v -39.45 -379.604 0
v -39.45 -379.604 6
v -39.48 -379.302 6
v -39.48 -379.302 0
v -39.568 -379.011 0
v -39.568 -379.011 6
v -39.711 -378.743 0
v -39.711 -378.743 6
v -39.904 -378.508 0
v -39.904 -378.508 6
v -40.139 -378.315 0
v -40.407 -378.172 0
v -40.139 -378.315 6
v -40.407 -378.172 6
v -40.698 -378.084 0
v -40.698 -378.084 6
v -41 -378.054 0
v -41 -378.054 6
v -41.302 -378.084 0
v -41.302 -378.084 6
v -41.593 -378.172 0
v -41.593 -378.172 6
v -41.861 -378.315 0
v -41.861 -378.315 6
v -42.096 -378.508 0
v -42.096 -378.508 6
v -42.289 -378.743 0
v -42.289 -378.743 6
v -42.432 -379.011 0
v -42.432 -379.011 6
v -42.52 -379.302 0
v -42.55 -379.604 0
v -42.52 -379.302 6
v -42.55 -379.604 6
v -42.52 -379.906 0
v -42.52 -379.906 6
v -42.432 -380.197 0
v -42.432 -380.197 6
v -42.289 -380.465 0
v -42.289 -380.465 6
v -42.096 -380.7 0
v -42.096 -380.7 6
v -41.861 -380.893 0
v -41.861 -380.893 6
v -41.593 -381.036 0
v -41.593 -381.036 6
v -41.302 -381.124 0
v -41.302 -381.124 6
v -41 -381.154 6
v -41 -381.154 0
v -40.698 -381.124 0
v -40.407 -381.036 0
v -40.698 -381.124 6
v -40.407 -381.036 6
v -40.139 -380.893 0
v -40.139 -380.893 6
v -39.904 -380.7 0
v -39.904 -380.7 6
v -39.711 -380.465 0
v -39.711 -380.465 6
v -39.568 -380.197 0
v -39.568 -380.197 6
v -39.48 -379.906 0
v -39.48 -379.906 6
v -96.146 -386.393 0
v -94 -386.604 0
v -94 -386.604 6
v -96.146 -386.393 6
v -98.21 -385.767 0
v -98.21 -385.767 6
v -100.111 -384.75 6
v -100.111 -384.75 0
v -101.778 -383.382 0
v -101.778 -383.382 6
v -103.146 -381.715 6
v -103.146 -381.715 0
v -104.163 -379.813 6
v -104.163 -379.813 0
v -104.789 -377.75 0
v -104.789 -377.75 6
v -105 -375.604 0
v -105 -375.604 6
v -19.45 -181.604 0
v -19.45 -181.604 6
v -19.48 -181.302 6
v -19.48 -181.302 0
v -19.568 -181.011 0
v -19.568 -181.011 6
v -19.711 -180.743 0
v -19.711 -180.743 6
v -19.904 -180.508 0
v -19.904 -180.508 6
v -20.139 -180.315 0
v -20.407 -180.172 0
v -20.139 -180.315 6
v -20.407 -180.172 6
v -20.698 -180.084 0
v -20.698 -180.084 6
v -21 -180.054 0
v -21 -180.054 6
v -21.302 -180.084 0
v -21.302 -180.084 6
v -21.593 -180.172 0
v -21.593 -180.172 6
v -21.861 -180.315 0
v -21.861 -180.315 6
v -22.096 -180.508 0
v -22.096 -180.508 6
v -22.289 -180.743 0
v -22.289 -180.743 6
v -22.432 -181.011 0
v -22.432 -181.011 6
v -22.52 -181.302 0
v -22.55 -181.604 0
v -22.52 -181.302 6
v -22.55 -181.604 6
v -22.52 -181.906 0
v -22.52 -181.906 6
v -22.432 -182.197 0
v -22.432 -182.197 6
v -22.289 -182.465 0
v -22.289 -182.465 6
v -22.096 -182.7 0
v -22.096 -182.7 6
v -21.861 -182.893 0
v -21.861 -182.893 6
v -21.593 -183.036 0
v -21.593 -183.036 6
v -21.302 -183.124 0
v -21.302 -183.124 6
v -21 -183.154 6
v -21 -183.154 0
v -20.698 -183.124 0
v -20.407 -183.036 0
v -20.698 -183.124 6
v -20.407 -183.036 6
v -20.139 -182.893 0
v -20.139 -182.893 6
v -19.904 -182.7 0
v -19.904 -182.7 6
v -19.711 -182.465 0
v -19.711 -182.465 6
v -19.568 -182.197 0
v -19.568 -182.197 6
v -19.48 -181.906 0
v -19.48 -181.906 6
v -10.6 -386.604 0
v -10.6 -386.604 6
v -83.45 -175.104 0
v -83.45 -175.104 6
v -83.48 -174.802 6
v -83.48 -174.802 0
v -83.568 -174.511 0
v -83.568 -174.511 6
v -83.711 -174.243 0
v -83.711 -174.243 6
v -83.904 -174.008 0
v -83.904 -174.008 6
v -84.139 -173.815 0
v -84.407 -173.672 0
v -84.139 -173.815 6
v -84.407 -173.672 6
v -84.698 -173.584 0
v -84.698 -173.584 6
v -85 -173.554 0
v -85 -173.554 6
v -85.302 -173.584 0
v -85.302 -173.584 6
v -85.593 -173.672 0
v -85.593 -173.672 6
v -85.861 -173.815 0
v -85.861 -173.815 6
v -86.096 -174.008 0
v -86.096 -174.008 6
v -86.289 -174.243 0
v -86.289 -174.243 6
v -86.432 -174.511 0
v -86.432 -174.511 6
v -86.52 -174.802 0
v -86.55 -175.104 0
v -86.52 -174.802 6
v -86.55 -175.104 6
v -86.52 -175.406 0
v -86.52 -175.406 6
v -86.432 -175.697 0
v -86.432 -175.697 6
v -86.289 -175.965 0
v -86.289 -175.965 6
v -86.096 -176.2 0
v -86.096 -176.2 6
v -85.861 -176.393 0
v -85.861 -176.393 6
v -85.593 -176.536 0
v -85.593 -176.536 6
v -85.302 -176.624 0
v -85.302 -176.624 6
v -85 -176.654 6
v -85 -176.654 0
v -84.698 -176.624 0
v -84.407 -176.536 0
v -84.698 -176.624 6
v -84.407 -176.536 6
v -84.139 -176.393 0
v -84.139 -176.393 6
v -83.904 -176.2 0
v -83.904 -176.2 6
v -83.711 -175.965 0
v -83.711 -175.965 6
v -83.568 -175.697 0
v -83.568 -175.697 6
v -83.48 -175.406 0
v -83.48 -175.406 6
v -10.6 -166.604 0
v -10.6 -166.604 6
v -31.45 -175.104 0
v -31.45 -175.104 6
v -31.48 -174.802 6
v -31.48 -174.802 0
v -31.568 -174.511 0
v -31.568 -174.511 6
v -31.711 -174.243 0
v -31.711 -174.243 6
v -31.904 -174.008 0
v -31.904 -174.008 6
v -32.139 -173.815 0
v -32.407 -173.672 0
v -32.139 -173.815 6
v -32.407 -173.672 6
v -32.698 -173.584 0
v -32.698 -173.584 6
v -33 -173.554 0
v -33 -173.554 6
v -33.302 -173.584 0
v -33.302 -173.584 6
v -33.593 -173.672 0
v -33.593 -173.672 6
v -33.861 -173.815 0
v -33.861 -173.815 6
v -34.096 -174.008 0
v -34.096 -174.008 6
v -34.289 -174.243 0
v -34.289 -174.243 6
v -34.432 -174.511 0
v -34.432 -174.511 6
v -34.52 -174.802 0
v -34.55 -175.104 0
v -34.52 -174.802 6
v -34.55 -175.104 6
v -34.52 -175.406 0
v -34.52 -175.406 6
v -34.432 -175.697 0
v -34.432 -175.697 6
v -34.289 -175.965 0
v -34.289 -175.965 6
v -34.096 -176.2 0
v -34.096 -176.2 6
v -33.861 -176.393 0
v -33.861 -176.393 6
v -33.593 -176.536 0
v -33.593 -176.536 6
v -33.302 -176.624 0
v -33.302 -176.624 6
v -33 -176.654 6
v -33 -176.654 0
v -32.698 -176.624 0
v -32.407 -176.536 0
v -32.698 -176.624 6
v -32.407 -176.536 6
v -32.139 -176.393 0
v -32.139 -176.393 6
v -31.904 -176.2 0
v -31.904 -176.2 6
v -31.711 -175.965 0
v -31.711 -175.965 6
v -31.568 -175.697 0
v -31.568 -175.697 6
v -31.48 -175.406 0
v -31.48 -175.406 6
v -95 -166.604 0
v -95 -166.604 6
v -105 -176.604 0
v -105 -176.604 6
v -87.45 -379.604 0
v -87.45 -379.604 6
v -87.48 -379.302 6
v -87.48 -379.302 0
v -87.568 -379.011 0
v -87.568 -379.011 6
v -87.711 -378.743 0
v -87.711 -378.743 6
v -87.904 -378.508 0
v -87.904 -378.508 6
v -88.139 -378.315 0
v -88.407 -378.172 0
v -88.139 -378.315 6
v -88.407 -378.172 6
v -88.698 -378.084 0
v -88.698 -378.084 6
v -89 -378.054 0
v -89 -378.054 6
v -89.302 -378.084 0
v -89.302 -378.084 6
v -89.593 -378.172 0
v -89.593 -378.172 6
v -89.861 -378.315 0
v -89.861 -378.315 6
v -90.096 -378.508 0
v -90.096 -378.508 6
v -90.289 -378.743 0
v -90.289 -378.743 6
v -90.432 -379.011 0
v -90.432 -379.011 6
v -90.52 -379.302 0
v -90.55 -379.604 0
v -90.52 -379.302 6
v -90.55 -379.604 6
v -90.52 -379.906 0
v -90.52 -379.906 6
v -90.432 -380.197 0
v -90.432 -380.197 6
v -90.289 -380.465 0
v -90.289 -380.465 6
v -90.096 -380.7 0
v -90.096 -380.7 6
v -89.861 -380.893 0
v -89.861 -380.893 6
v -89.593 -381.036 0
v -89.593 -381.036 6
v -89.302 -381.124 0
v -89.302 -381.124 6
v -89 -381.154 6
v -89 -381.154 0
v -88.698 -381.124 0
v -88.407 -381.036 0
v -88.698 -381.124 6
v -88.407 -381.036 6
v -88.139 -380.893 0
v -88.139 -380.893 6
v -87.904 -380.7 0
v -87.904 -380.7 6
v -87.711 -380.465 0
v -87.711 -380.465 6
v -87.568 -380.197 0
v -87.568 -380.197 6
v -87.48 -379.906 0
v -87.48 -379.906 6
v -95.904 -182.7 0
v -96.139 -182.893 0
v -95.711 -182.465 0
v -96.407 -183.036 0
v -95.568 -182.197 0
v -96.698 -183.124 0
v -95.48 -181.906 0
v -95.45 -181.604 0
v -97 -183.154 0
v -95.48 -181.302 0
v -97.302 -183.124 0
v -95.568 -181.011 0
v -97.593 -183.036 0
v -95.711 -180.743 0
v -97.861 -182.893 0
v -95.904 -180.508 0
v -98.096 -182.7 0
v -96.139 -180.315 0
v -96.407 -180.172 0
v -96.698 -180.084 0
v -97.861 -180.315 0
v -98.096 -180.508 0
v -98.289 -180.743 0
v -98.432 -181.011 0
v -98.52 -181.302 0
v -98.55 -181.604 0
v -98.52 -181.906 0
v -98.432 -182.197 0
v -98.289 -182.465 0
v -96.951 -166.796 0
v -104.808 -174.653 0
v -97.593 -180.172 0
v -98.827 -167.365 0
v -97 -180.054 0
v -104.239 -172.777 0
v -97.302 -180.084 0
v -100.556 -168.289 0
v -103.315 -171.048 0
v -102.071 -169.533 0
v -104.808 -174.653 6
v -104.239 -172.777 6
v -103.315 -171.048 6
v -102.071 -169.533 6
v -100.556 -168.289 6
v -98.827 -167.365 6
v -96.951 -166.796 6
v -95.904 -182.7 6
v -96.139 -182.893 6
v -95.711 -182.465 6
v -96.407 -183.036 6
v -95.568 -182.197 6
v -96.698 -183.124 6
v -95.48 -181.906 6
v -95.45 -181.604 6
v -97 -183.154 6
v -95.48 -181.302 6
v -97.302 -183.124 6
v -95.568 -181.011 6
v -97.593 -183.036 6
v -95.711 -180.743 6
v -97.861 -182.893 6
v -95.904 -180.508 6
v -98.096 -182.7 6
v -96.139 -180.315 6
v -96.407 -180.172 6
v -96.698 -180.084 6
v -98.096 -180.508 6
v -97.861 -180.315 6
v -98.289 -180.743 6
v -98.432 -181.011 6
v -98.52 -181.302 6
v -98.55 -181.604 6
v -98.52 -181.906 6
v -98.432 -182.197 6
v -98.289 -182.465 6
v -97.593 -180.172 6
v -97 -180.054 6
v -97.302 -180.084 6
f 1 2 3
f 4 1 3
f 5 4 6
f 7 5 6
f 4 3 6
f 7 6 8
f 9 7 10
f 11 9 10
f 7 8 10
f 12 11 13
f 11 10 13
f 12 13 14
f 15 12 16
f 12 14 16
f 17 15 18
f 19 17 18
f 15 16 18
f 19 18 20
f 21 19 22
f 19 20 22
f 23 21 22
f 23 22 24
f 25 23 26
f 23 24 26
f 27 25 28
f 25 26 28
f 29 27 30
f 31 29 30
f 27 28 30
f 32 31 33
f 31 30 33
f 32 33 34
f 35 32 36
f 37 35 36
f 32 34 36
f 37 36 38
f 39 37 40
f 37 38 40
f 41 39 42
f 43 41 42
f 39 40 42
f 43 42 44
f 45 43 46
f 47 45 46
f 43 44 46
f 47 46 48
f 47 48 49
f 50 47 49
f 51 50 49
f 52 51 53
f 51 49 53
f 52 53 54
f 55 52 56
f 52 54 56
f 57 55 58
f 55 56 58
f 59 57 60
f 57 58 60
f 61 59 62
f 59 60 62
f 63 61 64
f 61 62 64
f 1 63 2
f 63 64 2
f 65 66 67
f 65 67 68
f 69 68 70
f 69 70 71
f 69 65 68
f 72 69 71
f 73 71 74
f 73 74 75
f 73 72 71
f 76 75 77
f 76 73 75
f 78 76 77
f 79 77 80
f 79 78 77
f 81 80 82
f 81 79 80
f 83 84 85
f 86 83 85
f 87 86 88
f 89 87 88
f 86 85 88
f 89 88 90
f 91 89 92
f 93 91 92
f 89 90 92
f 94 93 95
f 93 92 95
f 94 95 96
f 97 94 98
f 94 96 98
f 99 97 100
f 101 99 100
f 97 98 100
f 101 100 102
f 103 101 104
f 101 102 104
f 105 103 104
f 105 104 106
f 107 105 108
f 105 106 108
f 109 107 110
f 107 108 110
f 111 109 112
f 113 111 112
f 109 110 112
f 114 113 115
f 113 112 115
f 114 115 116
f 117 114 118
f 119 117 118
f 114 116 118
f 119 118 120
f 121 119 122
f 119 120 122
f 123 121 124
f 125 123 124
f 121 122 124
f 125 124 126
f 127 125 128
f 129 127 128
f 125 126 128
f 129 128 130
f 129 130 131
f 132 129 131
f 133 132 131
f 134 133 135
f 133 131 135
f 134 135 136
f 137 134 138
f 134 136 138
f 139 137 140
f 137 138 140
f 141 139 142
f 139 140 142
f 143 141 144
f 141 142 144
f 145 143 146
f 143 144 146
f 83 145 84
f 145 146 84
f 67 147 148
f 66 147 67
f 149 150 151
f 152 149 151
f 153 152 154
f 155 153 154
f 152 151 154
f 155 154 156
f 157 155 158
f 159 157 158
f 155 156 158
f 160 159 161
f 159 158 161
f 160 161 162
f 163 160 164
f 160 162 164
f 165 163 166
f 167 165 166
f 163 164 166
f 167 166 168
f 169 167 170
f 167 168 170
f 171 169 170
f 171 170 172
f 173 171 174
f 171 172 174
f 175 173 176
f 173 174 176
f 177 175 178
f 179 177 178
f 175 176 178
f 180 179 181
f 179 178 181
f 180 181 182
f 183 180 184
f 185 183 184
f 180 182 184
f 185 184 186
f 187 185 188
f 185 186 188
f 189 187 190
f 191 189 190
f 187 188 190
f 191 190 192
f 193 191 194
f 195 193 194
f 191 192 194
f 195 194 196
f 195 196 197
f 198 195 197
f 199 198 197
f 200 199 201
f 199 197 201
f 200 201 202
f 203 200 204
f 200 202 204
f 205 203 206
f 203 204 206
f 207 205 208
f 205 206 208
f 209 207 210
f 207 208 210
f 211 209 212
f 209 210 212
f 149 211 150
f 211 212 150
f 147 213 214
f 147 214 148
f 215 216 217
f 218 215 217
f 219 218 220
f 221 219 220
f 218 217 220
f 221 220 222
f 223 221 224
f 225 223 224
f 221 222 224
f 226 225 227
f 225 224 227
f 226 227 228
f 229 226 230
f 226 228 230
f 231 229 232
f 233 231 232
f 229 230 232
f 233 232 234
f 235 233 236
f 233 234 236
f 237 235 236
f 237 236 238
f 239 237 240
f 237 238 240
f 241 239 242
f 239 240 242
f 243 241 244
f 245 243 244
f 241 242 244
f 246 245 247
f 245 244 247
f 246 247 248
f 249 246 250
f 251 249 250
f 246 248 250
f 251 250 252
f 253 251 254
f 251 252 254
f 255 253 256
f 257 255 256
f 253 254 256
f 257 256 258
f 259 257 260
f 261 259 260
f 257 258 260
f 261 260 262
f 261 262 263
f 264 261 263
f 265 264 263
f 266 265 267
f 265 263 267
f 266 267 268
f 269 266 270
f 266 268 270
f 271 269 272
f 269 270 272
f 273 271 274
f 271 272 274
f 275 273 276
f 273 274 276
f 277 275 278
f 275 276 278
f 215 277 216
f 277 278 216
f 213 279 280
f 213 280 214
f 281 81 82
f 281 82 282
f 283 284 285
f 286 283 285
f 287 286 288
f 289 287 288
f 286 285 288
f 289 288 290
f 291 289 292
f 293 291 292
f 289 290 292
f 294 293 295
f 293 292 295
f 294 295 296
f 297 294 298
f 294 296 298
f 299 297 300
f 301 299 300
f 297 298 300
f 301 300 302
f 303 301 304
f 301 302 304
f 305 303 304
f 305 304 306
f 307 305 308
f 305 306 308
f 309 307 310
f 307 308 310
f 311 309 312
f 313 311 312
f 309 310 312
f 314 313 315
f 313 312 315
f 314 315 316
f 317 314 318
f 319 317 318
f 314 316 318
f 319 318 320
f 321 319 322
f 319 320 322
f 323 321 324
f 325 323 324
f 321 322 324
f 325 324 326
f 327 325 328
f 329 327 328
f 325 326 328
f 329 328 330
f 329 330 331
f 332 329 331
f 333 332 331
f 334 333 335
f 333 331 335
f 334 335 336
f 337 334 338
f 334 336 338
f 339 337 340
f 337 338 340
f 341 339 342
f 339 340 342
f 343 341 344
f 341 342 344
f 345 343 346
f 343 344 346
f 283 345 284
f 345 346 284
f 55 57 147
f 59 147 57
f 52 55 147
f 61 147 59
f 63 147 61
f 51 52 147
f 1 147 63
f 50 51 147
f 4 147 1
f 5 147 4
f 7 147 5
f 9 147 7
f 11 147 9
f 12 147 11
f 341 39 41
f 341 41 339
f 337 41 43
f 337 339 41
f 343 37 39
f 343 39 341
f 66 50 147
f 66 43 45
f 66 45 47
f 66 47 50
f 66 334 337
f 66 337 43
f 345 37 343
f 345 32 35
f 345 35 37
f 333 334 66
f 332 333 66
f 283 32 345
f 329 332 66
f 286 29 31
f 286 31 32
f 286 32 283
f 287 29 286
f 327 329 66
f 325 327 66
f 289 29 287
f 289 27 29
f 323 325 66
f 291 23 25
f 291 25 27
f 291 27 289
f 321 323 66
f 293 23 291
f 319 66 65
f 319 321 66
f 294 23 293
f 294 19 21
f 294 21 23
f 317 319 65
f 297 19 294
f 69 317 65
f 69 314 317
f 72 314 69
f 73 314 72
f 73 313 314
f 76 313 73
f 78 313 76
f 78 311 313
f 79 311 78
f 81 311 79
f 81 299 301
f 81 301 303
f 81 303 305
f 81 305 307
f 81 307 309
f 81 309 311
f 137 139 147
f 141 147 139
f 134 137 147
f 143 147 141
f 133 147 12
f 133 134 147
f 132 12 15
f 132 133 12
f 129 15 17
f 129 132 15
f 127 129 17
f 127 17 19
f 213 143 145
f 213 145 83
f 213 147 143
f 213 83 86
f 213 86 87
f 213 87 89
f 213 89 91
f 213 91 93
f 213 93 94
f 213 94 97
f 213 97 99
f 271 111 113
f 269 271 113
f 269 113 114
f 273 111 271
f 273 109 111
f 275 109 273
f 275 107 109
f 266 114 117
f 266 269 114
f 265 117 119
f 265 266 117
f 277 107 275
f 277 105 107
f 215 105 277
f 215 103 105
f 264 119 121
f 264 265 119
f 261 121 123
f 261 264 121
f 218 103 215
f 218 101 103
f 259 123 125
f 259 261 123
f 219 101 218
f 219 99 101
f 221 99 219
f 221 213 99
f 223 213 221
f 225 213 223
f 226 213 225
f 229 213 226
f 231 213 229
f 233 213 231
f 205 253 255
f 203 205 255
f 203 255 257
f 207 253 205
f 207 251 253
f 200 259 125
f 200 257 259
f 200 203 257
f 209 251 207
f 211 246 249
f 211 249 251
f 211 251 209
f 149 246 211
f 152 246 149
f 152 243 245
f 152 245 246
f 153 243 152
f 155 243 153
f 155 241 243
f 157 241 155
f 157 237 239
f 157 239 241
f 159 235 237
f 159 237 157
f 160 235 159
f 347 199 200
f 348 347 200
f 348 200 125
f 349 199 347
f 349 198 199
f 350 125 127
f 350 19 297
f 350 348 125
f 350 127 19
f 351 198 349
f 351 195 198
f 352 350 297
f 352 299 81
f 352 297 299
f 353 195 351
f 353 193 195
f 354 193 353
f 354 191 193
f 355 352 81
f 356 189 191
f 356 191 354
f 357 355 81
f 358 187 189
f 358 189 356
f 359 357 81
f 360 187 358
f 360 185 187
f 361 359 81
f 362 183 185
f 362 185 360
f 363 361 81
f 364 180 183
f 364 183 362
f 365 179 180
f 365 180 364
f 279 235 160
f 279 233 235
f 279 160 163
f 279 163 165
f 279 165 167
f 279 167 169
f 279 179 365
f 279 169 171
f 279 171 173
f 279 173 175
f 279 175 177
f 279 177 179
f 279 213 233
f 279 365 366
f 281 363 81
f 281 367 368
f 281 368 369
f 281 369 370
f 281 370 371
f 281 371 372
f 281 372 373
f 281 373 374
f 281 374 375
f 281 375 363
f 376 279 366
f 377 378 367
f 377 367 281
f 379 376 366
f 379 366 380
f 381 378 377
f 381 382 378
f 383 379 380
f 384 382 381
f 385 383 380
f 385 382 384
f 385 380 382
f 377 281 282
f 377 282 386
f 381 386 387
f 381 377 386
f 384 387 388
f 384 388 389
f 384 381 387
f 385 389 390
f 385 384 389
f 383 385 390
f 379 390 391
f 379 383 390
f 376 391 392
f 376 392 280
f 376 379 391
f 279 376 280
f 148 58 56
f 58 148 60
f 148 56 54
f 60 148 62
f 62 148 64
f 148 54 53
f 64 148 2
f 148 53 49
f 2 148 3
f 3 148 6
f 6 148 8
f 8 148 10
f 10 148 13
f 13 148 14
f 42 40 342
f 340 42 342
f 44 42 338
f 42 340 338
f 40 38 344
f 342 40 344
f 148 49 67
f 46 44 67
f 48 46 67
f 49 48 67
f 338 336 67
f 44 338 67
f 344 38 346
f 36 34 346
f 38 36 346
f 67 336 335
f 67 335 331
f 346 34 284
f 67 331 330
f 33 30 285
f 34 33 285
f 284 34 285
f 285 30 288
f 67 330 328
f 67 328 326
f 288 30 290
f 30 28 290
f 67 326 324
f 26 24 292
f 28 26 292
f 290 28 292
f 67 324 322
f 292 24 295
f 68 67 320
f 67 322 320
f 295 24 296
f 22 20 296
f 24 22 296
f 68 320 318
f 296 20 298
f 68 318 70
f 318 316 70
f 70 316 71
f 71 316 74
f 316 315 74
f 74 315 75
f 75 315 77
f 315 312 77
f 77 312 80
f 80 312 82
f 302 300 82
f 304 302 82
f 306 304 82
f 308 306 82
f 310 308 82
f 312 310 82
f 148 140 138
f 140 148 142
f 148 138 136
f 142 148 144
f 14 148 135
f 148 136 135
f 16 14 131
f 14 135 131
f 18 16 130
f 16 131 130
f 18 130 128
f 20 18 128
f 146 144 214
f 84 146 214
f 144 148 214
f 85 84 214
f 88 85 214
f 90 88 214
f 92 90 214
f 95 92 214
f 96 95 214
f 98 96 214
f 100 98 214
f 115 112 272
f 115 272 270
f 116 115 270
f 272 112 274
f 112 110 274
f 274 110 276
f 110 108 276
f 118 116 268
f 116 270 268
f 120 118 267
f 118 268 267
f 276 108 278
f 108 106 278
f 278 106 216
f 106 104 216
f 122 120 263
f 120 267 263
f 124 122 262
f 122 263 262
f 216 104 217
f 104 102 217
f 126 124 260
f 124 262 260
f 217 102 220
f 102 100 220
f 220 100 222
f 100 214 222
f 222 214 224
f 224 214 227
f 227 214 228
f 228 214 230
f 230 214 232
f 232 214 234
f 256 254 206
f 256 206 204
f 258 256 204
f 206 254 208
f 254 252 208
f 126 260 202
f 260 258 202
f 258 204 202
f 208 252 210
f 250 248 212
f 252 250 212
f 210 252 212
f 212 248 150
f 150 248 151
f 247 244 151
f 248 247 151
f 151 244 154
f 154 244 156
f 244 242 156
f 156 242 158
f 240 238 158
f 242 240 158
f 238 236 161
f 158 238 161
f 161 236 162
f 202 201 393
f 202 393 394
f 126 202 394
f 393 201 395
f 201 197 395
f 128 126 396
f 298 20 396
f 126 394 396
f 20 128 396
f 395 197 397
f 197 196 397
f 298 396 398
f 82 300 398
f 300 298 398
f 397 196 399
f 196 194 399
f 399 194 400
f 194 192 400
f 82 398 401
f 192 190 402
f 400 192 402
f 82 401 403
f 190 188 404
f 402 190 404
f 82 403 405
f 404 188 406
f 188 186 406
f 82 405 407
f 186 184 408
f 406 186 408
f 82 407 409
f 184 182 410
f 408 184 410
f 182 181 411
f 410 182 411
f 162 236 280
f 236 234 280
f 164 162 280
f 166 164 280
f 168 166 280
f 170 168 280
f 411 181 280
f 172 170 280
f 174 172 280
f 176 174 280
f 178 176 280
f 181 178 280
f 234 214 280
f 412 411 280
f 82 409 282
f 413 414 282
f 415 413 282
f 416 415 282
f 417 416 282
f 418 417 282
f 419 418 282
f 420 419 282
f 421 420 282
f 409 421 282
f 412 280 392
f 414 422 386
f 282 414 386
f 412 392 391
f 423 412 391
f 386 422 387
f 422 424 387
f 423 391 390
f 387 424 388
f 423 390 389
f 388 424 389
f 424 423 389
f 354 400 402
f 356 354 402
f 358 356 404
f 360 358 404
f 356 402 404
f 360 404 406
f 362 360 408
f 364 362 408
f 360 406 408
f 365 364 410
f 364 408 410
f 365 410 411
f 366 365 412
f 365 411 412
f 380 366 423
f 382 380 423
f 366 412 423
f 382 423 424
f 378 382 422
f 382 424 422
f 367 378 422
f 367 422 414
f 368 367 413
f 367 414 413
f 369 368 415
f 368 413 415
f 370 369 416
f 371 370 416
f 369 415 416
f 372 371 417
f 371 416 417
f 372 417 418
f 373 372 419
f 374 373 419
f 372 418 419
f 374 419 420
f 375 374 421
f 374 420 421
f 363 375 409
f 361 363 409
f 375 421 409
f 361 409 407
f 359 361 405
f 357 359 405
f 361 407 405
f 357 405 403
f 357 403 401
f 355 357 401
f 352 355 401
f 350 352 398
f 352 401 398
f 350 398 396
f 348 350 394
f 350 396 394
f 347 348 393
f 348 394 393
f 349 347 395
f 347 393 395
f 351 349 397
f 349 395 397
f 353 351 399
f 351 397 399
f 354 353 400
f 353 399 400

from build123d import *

# Parameters (mm, degrees)
DODANIE_WYCI_GNI_CIE1_DEPTH = 6
SZKIC4_R                    = 1.55
WYTNIJ_WYCI_GNI_CIE1_DEPTH  = 6
SZKIC7_R                    = 1.55
WYTNIJ_WYCI_GNI_CIE3_DEPTH  = 6


with BuildPart() as part:
    # Szkic2 → Dodanie-wyciągnięcie1 (new body)
    with BuildSketch(Plane.XY):
        with BuildLine():
            Line((-10.6, -166.603962956), (-10.6, -386.603962956))
            Line((-10.6, -386.603962956), (-94, -386.603962956))
            ThreePointArc((-94, -386.603962956), (-101.778174593, -383.382137549), (-105, -375.603962956))
            Line((-105, -375.603962956), (-105, -176.603962956))
            ThreePointArc((-105, -176.603962956), (-102.071067812, -169.532895144), (-95, -166.603962956))
            Line((-95, -166.603962956), (-10.6, -166.603962956))
        make_face()
    extrude(amount=DODANIE_WYCI_GNI_CIE1_DEPTH)

    # Szkic4 → Wytnij-wyciągnięcie1 (cut)
    with BuildSketch(Plane.XY.offset(6)):
        with Locations((-41, -379.603962956)):
            Circle(SZKIC4_R)
        with Locations((-89, -379.603962956)):
            Circle(SZKIC4_R)
    extrude(amount=-WYTNIJ_WYCI_GNI_CIE1_DEPTH, mode=Mode.SUBTRACT)

    # Szkic7 → Wytnij-wyciągnięcie3 (cut)
    with BuildSketch(Plane.XY.offset(6)):
        with Locations((-21, -181.603962956)):
            Circle(SZKIC7_R)
        with Locations((-97, -181.603962956)):
            Circle(SZKIC7_R)
        with Locations((-85, -175.103962956)):
            Circle(SZKIC7_R)
        with Locations((-33, -175.103962956)):
            Circle(SZKIC7_R)
    extrude(amount=-WYTNIJ_WYCI_GNI_CIE3_DEPTH, mode=Mode.SUBTRACT)


solid = part.part
